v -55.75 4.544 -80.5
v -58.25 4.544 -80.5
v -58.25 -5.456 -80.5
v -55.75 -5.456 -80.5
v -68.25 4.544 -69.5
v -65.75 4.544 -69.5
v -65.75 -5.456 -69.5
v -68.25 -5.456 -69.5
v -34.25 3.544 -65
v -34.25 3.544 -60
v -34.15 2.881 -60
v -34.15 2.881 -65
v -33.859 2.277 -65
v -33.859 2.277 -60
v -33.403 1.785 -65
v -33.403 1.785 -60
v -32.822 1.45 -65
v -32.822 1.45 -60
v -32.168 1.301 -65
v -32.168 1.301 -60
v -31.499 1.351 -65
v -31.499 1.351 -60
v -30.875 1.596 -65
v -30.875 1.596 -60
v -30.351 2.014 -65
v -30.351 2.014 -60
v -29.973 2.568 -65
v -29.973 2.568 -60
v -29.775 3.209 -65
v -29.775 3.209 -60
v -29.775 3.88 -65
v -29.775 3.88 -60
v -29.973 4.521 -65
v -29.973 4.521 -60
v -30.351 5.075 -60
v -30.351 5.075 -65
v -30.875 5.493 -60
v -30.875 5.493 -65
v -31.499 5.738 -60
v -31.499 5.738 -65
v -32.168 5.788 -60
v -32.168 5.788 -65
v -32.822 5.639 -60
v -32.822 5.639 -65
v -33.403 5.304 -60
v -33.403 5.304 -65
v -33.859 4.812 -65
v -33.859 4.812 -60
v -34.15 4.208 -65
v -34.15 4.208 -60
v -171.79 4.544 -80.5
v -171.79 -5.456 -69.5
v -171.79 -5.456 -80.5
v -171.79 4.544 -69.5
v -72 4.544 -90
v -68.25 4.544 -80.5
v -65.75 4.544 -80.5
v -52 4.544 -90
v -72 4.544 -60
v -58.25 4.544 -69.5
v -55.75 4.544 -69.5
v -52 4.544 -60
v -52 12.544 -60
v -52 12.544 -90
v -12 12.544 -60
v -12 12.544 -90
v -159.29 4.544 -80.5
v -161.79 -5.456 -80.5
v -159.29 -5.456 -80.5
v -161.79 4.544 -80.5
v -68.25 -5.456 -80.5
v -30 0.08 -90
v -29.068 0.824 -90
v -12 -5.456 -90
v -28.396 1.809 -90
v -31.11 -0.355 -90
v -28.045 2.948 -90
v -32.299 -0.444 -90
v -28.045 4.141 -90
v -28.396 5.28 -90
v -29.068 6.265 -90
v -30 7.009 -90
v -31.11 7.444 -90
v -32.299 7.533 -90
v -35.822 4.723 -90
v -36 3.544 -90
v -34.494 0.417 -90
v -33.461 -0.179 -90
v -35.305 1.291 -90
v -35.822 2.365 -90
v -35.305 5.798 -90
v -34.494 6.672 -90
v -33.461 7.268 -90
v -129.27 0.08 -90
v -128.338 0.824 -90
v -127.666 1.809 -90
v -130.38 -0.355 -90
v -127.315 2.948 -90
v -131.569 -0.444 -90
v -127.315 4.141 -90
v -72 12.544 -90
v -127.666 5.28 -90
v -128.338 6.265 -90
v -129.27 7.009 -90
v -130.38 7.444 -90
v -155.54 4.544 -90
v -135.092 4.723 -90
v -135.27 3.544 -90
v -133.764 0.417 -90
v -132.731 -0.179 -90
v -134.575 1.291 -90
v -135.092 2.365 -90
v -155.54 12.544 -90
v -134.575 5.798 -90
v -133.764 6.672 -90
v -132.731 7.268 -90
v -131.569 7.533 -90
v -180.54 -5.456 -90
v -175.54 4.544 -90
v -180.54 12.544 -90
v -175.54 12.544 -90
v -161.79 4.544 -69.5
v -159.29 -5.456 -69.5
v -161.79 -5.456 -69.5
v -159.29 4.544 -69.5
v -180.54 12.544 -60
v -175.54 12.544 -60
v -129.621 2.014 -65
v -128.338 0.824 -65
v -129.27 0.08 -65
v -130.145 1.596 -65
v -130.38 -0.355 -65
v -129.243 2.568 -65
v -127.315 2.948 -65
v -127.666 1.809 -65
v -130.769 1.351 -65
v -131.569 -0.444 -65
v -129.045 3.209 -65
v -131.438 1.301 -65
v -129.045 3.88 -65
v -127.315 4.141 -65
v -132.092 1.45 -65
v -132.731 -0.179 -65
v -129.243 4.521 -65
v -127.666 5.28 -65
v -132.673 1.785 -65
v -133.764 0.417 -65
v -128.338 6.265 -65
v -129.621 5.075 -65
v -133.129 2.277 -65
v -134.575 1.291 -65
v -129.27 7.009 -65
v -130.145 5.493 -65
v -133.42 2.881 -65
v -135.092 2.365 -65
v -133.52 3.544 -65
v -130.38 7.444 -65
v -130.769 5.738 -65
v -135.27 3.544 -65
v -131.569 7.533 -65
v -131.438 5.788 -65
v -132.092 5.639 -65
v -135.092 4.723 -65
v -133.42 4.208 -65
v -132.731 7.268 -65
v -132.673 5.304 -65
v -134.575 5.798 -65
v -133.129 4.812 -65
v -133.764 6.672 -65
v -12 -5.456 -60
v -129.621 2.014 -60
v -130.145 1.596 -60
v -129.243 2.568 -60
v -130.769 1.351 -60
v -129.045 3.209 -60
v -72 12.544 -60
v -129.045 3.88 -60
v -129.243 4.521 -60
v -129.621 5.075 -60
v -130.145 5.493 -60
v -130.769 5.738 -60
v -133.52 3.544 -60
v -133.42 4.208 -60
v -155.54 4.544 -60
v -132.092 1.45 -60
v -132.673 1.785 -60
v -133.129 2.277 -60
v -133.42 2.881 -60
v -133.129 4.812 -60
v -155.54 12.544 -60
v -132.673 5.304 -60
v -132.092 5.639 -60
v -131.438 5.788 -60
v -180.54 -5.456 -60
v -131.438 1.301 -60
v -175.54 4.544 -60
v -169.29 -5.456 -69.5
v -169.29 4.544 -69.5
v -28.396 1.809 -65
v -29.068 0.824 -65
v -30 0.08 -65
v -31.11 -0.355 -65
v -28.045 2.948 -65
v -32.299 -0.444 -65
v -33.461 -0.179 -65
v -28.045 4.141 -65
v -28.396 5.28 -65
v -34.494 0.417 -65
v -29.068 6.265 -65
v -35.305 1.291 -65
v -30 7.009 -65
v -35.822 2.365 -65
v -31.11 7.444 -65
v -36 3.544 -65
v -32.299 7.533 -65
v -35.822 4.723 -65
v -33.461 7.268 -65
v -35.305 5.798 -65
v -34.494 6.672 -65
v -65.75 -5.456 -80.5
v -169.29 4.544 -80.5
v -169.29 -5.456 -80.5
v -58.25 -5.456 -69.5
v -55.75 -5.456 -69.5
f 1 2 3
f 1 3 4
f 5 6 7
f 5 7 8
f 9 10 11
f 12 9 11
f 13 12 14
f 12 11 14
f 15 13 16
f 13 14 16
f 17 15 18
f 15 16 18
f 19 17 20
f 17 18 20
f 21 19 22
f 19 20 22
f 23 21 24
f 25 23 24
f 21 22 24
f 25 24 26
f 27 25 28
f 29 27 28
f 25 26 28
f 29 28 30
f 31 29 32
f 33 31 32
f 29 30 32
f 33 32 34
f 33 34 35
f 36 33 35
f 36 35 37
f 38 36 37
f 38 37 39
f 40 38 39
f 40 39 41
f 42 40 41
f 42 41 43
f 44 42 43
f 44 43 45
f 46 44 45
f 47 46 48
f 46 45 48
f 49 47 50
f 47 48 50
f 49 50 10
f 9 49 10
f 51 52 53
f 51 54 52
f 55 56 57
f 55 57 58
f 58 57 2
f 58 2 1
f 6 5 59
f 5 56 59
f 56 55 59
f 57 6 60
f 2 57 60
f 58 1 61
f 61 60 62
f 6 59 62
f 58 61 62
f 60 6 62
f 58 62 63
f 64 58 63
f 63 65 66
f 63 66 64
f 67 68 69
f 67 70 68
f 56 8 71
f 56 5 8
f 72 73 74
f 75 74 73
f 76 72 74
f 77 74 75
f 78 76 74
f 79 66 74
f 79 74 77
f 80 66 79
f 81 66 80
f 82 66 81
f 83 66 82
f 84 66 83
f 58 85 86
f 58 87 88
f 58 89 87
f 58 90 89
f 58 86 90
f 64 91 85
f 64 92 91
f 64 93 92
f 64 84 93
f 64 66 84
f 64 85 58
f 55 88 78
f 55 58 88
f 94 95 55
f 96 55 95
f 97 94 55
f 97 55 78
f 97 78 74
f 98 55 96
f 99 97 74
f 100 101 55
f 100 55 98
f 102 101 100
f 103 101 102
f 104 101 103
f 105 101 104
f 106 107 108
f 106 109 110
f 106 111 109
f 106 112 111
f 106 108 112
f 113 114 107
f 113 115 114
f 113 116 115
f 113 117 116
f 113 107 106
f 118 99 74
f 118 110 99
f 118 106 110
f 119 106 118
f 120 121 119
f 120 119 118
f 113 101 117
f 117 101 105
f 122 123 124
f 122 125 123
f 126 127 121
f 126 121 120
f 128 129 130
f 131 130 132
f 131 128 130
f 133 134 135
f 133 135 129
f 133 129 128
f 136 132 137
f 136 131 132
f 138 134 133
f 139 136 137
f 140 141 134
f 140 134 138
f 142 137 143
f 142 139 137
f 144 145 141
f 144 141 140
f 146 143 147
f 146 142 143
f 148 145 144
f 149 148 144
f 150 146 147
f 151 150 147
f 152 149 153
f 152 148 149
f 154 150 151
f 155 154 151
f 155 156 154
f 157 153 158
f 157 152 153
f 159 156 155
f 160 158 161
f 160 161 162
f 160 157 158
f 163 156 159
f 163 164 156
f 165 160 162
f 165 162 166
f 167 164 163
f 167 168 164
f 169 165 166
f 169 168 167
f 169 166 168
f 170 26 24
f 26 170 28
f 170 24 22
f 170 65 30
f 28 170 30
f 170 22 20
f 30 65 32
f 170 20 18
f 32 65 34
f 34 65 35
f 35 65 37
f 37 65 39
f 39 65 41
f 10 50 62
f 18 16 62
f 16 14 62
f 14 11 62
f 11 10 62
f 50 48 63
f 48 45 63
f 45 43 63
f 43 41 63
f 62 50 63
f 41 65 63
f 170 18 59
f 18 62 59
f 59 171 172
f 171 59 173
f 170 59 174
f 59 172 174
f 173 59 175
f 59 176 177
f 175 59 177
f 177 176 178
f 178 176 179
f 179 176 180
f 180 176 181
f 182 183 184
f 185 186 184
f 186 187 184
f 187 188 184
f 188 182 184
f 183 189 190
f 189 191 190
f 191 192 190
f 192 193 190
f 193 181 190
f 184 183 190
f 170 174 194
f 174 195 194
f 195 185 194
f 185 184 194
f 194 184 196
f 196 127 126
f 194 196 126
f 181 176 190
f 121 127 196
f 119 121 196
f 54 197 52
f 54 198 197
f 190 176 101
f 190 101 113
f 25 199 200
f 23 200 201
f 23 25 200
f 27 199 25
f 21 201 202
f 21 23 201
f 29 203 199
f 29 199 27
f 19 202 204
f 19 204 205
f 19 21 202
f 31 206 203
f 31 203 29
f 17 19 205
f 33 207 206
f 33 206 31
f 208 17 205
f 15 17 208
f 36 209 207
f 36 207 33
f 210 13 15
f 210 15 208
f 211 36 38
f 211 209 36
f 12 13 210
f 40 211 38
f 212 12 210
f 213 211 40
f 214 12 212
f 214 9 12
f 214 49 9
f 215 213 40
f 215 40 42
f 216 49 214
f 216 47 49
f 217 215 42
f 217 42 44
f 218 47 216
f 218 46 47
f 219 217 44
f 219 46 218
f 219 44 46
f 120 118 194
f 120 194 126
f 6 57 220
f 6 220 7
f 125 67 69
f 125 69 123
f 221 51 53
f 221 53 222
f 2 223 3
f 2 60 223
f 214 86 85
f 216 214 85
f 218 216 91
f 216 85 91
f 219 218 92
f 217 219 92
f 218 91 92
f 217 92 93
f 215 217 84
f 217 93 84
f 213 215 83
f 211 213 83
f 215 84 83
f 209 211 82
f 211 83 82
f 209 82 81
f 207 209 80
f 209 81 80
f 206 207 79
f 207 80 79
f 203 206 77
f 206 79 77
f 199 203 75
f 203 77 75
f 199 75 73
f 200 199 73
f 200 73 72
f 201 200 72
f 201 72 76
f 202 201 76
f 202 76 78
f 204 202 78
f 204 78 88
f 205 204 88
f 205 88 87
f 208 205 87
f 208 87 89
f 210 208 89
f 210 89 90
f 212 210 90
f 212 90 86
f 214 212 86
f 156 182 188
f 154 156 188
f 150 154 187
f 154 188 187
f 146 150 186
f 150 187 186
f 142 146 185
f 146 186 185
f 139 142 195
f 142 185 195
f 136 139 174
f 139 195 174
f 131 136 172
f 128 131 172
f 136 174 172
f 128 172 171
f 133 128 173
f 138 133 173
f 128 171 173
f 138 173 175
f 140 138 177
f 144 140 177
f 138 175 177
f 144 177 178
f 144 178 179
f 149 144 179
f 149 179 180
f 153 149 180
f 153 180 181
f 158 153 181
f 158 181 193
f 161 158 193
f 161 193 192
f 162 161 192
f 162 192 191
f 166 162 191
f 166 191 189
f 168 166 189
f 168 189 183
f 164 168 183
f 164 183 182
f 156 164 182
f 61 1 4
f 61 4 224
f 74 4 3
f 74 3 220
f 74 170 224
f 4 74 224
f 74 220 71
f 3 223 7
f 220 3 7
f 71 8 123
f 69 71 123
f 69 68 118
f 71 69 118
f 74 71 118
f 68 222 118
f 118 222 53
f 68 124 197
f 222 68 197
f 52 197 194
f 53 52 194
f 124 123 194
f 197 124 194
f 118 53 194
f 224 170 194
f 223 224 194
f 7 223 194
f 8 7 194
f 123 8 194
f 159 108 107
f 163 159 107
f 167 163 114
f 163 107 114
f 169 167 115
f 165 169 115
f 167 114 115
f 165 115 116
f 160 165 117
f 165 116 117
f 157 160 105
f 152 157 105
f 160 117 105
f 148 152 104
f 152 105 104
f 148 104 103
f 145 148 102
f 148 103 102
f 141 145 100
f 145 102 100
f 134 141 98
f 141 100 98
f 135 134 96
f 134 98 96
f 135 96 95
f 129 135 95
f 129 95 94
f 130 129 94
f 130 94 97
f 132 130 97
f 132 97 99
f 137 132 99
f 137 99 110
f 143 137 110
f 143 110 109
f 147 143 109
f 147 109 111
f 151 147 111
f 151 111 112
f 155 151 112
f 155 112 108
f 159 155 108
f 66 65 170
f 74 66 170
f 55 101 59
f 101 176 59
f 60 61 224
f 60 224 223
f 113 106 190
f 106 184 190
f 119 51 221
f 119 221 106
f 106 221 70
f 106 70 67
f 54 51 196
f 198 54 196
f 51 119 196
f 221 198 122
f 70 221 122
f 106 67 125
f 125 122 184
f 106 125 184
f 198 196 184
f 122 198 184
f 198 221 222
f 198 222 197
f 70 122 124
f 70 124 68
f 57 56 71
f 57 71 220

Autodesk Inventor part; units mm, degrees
ref_plane "YZ Plane" through (0, 0, 0) normal (1, 0, 0) x (0, 1, 0)
ref_plane "XZ Plane" through (0, 0, 0) normal (0, 1, 0) x (-1, 0, 0)
ref_plane "작업 평면1" through (18, 12.5444, -60) normal (0, 0, -1) x (-1, 0, 0)
sketch "스케치1" plane through (18, 12.5444, -60) normal (0, 0, -1) x (-1, 0, 0)
  circle A0 centre (149.27, -9) radius 2.25 projected
  circle A1 centre (50, -9) radius 2.25 projected
  line L0 (60.4781, -35) -> (62.5565, -31.4) projected
  line L1 (62.5565, -31.4) -> (66.7134, -31.4) projected
  line L2 (66.7134, -31.4) -> (68.7919, -35) projected
  line L3 (68.7919, -35) -> (66.7134, -38.6) projected
  line L4 (66.7134, -38.6) -> (62.5565, -38.6) projected
  line L5 (62.5565, -38.6) -> (60.4781, -35) projected
  line L6 (161.8265, -38.6) -> (159.748, -35) projected
  line L7 (159.748, -35) -> (161.8265, -31.4) projected
  line L8 (161.8265, -31.4) -> (165.9834, -31.4) projected
  line L9 (165.9834, -31.4) -> (168.0619, -35) projected
  line L10 (168.0619, -35) -> (165.9834, -38.6) projected
  line L11 (165.9834, -38.6) -> (161.8265, -38.6) projected
  line L12 (30, -50) -> (198.5399, -50) projected
  line L13 (198.5399, -50) -> (198.5399, 0) projected
  line L14 (0, 0) -> (198.5399, 0) projected
  line L15 (0, 0) -> (0, -12.5444) projected
  line L16 (0, -12.5444) -> (30, -12.5444) projected
  line L17 (30, -12.5444) -> (30, -50) projected
  line L18 (30, 0) -> (30, -18)
  line L19 (30, -18) -> (198.5399, -18)
  line L20 (198.5399, -18) -> (198.5399, 0)
  line L21 (176.0399, 8) -> (191.0399, 8) projected
  line L22 (72.5, 8) -> (87.5, 8) projected
  line L23 (193.5399, -8) -> (173.5399, -8)
  line L24 (173.5399, -8) -> (173.5399, 0)
  line L25 (193.5399, 0) -> (193.5399, -8)
  line L26 (90, -8) -> (70, -8)
  line L27 (70, -8) -> (70, 0)
  line L28 (90, 0) -> (90, -8)
  line L29 (70, 0) -> (30, 0)
  line L30 (198.5399, 0) -> (193.5399, 0)
  line L31 (173.5399, 0) -> (90, 0)
  point P0 (18, -12.5444)
  point P1 (80, -8)
  point P2 (80, 8)
  point P3 (183.5399, -8)
  point P4 (183.5399, 8)
  point P5 (70, 0)
  dimension "d1" = 18
  dimension "d6" = 8
  dimension "d7" = 8
extrude "돌출1" add sketch "스케치1" along normal blind 30 contours L17 L18 L14 L27 L26 L28 L24 L23 L25 L13 L19
sketch "스케치2" plane through (18, 12.5444, -90) normal (0, 0, -1) x (-1, 0, 0)
  circle A0 centre (149.27, -9) radius 2.25 projected
  circle A1 centre (50, -9) radius 2.25 projected
  circle A2 centre (149.27, -9) radius 4
  circle A3 centre (50, -9) radius 4
  point P0 (18, -12.5444)
  dimension "d10" = 8
  dimension "d11" = 8
extrude "돌출2" cut sketch "스케치2" against normal blind 25 contours A0 | A1 | A2 | A3
sketch "스케치3" plane through (-175.5399, 4.5444, -60) normal (0, 1, 0) x (1, 0, 0)
  line L0 (0, 0) -> (20, 0) projected
  line L1 (20, 0) -> (20, 30) projected
  line L2 (0, 30) -> (20, 30) projected
  line L3 (0, 0) -> (0, 30) projected
  line L4 (103.5399, 0) -> (123.5399, 0) projected
  line L5 (123.5399, 0) -> (123.5399, 30) projected
  line L6 (103.5399, 30) -> (123.5399, 30) projected
  line L7 (103.5399, 0) -> (103.5399, 30) projected
  line L8 (5, 20.5) -> (15, 20.5)
  line L9 (15, 20.5) -> (15, 9.5)
  line L10 (15, 9.5) -> (5, 9.5)
  line L11 (5, 9.5) -> (5, 20.5)
  line L12 (5, 20.5) -> (15, 9.5) construction
  line L13 (15, 20.5) -> (5, 9.5) construction
  line L14 (108.5399, 20.5) -> (118.5399, 20.5)
  line L15 (118.5399, 20.5) -> (118.5399, 9.5)
  line L16 (118.5399, 9.5) -> (108.5399, 9.5)
  line L17 (108.5399, 9.5) -> (108.5399, 20.5)
  line L18 (108.5399, 20.5) -> (118.5399, 9.5) construction
  line L19 (118.5399, 20.5) -> (108.5399, 9.5) construction
  line L20 (3.75, 20.5) -> (6.25, 20.5)
  line L21 (6.25, 20.5) -> (6.25, 9.5)
  line L22 (6.25, 9.5) -> (3.75, 9.5)
  line L23 (3.75, 9.5) -> (3.75, 20.5)
  line L24 (3.75, 20.5) -> (6.25, 9.5) construction
  line L25 (6.25, 20.5) -> (3.75, 9.5) construction
  line L26 (13.75, 20.5) -> (16.25, 20.5)
  line L27 (16.25, 20.5) -> (16.25, 9.5)
  line L28 (16.25, 9.5) -> (13.75, 9.5)
  line L29 (13.75, 9.5) -> (13.75, 20.5)
  line L30 (13.75, 20.5) -> (16.25, 9.5) construction
  line L31 (16.25, 20.5) -> (13.75, 9.5) construction
  line L32 (107.2899, 20.5) -> (109.7899, 20.5)
  line L33 (109.7899, 20.5) -> (109.7899, 9.5)
  line L34 (109.7899, 9.5) -> (107.2899, 9.5)
  line L35 (107.2899, 9.5) -> (107.2899, 20.5)
  line L36 (107.2899, 20.5) -> (109.7899, 9.5) construction
  line L37 (109.7899, 20.5) -> (107.2899, 9.5) construction
  line L38 (117.2899, 20.5) -> (119.7899, 20.5)
  line L39 (119.7899, 20.5) -> (119.7899, 9.5)
  line L40 (119.7899, 9.5) -> (117.2899, 9.5)
  line L41 (117.2899, 9.5) -> (117.2899, 20.5)
  line L42 (117.2899, 20.5) -> (119.7899, 9.5) construction
  line L43 (119.7899, 20.5) -> (117.2899, 9.5) construction
  point P0 (175.5399, -60)
  point P1 (10, 15)
  point P2 (113.5399, 15)
  point P3 (5, 15)
  point P4 (15, 15)
  point P5 (108.5399, 15)
  point P6 (118.5399, 15)
  point P7 (118.5399, 20.5)
  point P8 (117.2899, 20.5)
  point P9 (117.2899, 9.5)
  point P10 (118.5399, 9.5)
  point P11 (108.5399, 9.5)
  point P12 (109.7899, 20.5)
  point P13 (108.5399, 20.5)
  point P14 (13.75, 20.5)
  point P15 (13.75, 9.5)
  point P16 (15, 9.5)
  point P17 (15, 20.5)
  point P18 (6.25, 20.5)
  point P19 (5, 20.5)
  point P20 (5, 9.5)
  dimension "d14" = 10
  dimension "d15" = 11
  dimension "d16" = 10
  dimension "d17" = 11
  dimension "d18" = 2.5
  dimension "d19" = 2.5
  dimension "d20" = 2.5
  dimension "d21" = 2.5
extrude "돌출3" cut sketch "스케치3" against normal through all contours L8 L21 L10 L11 | L11 L22 L23 L20 | L8 L9 L10 L29 | L26 L27 L28 L9 | L14 L33 L16 L17 | L17 L34 L35 L32 | L14 L15 L16 L41 | L38 L39 L40 L15
properties part number "side_ToF_mount"
